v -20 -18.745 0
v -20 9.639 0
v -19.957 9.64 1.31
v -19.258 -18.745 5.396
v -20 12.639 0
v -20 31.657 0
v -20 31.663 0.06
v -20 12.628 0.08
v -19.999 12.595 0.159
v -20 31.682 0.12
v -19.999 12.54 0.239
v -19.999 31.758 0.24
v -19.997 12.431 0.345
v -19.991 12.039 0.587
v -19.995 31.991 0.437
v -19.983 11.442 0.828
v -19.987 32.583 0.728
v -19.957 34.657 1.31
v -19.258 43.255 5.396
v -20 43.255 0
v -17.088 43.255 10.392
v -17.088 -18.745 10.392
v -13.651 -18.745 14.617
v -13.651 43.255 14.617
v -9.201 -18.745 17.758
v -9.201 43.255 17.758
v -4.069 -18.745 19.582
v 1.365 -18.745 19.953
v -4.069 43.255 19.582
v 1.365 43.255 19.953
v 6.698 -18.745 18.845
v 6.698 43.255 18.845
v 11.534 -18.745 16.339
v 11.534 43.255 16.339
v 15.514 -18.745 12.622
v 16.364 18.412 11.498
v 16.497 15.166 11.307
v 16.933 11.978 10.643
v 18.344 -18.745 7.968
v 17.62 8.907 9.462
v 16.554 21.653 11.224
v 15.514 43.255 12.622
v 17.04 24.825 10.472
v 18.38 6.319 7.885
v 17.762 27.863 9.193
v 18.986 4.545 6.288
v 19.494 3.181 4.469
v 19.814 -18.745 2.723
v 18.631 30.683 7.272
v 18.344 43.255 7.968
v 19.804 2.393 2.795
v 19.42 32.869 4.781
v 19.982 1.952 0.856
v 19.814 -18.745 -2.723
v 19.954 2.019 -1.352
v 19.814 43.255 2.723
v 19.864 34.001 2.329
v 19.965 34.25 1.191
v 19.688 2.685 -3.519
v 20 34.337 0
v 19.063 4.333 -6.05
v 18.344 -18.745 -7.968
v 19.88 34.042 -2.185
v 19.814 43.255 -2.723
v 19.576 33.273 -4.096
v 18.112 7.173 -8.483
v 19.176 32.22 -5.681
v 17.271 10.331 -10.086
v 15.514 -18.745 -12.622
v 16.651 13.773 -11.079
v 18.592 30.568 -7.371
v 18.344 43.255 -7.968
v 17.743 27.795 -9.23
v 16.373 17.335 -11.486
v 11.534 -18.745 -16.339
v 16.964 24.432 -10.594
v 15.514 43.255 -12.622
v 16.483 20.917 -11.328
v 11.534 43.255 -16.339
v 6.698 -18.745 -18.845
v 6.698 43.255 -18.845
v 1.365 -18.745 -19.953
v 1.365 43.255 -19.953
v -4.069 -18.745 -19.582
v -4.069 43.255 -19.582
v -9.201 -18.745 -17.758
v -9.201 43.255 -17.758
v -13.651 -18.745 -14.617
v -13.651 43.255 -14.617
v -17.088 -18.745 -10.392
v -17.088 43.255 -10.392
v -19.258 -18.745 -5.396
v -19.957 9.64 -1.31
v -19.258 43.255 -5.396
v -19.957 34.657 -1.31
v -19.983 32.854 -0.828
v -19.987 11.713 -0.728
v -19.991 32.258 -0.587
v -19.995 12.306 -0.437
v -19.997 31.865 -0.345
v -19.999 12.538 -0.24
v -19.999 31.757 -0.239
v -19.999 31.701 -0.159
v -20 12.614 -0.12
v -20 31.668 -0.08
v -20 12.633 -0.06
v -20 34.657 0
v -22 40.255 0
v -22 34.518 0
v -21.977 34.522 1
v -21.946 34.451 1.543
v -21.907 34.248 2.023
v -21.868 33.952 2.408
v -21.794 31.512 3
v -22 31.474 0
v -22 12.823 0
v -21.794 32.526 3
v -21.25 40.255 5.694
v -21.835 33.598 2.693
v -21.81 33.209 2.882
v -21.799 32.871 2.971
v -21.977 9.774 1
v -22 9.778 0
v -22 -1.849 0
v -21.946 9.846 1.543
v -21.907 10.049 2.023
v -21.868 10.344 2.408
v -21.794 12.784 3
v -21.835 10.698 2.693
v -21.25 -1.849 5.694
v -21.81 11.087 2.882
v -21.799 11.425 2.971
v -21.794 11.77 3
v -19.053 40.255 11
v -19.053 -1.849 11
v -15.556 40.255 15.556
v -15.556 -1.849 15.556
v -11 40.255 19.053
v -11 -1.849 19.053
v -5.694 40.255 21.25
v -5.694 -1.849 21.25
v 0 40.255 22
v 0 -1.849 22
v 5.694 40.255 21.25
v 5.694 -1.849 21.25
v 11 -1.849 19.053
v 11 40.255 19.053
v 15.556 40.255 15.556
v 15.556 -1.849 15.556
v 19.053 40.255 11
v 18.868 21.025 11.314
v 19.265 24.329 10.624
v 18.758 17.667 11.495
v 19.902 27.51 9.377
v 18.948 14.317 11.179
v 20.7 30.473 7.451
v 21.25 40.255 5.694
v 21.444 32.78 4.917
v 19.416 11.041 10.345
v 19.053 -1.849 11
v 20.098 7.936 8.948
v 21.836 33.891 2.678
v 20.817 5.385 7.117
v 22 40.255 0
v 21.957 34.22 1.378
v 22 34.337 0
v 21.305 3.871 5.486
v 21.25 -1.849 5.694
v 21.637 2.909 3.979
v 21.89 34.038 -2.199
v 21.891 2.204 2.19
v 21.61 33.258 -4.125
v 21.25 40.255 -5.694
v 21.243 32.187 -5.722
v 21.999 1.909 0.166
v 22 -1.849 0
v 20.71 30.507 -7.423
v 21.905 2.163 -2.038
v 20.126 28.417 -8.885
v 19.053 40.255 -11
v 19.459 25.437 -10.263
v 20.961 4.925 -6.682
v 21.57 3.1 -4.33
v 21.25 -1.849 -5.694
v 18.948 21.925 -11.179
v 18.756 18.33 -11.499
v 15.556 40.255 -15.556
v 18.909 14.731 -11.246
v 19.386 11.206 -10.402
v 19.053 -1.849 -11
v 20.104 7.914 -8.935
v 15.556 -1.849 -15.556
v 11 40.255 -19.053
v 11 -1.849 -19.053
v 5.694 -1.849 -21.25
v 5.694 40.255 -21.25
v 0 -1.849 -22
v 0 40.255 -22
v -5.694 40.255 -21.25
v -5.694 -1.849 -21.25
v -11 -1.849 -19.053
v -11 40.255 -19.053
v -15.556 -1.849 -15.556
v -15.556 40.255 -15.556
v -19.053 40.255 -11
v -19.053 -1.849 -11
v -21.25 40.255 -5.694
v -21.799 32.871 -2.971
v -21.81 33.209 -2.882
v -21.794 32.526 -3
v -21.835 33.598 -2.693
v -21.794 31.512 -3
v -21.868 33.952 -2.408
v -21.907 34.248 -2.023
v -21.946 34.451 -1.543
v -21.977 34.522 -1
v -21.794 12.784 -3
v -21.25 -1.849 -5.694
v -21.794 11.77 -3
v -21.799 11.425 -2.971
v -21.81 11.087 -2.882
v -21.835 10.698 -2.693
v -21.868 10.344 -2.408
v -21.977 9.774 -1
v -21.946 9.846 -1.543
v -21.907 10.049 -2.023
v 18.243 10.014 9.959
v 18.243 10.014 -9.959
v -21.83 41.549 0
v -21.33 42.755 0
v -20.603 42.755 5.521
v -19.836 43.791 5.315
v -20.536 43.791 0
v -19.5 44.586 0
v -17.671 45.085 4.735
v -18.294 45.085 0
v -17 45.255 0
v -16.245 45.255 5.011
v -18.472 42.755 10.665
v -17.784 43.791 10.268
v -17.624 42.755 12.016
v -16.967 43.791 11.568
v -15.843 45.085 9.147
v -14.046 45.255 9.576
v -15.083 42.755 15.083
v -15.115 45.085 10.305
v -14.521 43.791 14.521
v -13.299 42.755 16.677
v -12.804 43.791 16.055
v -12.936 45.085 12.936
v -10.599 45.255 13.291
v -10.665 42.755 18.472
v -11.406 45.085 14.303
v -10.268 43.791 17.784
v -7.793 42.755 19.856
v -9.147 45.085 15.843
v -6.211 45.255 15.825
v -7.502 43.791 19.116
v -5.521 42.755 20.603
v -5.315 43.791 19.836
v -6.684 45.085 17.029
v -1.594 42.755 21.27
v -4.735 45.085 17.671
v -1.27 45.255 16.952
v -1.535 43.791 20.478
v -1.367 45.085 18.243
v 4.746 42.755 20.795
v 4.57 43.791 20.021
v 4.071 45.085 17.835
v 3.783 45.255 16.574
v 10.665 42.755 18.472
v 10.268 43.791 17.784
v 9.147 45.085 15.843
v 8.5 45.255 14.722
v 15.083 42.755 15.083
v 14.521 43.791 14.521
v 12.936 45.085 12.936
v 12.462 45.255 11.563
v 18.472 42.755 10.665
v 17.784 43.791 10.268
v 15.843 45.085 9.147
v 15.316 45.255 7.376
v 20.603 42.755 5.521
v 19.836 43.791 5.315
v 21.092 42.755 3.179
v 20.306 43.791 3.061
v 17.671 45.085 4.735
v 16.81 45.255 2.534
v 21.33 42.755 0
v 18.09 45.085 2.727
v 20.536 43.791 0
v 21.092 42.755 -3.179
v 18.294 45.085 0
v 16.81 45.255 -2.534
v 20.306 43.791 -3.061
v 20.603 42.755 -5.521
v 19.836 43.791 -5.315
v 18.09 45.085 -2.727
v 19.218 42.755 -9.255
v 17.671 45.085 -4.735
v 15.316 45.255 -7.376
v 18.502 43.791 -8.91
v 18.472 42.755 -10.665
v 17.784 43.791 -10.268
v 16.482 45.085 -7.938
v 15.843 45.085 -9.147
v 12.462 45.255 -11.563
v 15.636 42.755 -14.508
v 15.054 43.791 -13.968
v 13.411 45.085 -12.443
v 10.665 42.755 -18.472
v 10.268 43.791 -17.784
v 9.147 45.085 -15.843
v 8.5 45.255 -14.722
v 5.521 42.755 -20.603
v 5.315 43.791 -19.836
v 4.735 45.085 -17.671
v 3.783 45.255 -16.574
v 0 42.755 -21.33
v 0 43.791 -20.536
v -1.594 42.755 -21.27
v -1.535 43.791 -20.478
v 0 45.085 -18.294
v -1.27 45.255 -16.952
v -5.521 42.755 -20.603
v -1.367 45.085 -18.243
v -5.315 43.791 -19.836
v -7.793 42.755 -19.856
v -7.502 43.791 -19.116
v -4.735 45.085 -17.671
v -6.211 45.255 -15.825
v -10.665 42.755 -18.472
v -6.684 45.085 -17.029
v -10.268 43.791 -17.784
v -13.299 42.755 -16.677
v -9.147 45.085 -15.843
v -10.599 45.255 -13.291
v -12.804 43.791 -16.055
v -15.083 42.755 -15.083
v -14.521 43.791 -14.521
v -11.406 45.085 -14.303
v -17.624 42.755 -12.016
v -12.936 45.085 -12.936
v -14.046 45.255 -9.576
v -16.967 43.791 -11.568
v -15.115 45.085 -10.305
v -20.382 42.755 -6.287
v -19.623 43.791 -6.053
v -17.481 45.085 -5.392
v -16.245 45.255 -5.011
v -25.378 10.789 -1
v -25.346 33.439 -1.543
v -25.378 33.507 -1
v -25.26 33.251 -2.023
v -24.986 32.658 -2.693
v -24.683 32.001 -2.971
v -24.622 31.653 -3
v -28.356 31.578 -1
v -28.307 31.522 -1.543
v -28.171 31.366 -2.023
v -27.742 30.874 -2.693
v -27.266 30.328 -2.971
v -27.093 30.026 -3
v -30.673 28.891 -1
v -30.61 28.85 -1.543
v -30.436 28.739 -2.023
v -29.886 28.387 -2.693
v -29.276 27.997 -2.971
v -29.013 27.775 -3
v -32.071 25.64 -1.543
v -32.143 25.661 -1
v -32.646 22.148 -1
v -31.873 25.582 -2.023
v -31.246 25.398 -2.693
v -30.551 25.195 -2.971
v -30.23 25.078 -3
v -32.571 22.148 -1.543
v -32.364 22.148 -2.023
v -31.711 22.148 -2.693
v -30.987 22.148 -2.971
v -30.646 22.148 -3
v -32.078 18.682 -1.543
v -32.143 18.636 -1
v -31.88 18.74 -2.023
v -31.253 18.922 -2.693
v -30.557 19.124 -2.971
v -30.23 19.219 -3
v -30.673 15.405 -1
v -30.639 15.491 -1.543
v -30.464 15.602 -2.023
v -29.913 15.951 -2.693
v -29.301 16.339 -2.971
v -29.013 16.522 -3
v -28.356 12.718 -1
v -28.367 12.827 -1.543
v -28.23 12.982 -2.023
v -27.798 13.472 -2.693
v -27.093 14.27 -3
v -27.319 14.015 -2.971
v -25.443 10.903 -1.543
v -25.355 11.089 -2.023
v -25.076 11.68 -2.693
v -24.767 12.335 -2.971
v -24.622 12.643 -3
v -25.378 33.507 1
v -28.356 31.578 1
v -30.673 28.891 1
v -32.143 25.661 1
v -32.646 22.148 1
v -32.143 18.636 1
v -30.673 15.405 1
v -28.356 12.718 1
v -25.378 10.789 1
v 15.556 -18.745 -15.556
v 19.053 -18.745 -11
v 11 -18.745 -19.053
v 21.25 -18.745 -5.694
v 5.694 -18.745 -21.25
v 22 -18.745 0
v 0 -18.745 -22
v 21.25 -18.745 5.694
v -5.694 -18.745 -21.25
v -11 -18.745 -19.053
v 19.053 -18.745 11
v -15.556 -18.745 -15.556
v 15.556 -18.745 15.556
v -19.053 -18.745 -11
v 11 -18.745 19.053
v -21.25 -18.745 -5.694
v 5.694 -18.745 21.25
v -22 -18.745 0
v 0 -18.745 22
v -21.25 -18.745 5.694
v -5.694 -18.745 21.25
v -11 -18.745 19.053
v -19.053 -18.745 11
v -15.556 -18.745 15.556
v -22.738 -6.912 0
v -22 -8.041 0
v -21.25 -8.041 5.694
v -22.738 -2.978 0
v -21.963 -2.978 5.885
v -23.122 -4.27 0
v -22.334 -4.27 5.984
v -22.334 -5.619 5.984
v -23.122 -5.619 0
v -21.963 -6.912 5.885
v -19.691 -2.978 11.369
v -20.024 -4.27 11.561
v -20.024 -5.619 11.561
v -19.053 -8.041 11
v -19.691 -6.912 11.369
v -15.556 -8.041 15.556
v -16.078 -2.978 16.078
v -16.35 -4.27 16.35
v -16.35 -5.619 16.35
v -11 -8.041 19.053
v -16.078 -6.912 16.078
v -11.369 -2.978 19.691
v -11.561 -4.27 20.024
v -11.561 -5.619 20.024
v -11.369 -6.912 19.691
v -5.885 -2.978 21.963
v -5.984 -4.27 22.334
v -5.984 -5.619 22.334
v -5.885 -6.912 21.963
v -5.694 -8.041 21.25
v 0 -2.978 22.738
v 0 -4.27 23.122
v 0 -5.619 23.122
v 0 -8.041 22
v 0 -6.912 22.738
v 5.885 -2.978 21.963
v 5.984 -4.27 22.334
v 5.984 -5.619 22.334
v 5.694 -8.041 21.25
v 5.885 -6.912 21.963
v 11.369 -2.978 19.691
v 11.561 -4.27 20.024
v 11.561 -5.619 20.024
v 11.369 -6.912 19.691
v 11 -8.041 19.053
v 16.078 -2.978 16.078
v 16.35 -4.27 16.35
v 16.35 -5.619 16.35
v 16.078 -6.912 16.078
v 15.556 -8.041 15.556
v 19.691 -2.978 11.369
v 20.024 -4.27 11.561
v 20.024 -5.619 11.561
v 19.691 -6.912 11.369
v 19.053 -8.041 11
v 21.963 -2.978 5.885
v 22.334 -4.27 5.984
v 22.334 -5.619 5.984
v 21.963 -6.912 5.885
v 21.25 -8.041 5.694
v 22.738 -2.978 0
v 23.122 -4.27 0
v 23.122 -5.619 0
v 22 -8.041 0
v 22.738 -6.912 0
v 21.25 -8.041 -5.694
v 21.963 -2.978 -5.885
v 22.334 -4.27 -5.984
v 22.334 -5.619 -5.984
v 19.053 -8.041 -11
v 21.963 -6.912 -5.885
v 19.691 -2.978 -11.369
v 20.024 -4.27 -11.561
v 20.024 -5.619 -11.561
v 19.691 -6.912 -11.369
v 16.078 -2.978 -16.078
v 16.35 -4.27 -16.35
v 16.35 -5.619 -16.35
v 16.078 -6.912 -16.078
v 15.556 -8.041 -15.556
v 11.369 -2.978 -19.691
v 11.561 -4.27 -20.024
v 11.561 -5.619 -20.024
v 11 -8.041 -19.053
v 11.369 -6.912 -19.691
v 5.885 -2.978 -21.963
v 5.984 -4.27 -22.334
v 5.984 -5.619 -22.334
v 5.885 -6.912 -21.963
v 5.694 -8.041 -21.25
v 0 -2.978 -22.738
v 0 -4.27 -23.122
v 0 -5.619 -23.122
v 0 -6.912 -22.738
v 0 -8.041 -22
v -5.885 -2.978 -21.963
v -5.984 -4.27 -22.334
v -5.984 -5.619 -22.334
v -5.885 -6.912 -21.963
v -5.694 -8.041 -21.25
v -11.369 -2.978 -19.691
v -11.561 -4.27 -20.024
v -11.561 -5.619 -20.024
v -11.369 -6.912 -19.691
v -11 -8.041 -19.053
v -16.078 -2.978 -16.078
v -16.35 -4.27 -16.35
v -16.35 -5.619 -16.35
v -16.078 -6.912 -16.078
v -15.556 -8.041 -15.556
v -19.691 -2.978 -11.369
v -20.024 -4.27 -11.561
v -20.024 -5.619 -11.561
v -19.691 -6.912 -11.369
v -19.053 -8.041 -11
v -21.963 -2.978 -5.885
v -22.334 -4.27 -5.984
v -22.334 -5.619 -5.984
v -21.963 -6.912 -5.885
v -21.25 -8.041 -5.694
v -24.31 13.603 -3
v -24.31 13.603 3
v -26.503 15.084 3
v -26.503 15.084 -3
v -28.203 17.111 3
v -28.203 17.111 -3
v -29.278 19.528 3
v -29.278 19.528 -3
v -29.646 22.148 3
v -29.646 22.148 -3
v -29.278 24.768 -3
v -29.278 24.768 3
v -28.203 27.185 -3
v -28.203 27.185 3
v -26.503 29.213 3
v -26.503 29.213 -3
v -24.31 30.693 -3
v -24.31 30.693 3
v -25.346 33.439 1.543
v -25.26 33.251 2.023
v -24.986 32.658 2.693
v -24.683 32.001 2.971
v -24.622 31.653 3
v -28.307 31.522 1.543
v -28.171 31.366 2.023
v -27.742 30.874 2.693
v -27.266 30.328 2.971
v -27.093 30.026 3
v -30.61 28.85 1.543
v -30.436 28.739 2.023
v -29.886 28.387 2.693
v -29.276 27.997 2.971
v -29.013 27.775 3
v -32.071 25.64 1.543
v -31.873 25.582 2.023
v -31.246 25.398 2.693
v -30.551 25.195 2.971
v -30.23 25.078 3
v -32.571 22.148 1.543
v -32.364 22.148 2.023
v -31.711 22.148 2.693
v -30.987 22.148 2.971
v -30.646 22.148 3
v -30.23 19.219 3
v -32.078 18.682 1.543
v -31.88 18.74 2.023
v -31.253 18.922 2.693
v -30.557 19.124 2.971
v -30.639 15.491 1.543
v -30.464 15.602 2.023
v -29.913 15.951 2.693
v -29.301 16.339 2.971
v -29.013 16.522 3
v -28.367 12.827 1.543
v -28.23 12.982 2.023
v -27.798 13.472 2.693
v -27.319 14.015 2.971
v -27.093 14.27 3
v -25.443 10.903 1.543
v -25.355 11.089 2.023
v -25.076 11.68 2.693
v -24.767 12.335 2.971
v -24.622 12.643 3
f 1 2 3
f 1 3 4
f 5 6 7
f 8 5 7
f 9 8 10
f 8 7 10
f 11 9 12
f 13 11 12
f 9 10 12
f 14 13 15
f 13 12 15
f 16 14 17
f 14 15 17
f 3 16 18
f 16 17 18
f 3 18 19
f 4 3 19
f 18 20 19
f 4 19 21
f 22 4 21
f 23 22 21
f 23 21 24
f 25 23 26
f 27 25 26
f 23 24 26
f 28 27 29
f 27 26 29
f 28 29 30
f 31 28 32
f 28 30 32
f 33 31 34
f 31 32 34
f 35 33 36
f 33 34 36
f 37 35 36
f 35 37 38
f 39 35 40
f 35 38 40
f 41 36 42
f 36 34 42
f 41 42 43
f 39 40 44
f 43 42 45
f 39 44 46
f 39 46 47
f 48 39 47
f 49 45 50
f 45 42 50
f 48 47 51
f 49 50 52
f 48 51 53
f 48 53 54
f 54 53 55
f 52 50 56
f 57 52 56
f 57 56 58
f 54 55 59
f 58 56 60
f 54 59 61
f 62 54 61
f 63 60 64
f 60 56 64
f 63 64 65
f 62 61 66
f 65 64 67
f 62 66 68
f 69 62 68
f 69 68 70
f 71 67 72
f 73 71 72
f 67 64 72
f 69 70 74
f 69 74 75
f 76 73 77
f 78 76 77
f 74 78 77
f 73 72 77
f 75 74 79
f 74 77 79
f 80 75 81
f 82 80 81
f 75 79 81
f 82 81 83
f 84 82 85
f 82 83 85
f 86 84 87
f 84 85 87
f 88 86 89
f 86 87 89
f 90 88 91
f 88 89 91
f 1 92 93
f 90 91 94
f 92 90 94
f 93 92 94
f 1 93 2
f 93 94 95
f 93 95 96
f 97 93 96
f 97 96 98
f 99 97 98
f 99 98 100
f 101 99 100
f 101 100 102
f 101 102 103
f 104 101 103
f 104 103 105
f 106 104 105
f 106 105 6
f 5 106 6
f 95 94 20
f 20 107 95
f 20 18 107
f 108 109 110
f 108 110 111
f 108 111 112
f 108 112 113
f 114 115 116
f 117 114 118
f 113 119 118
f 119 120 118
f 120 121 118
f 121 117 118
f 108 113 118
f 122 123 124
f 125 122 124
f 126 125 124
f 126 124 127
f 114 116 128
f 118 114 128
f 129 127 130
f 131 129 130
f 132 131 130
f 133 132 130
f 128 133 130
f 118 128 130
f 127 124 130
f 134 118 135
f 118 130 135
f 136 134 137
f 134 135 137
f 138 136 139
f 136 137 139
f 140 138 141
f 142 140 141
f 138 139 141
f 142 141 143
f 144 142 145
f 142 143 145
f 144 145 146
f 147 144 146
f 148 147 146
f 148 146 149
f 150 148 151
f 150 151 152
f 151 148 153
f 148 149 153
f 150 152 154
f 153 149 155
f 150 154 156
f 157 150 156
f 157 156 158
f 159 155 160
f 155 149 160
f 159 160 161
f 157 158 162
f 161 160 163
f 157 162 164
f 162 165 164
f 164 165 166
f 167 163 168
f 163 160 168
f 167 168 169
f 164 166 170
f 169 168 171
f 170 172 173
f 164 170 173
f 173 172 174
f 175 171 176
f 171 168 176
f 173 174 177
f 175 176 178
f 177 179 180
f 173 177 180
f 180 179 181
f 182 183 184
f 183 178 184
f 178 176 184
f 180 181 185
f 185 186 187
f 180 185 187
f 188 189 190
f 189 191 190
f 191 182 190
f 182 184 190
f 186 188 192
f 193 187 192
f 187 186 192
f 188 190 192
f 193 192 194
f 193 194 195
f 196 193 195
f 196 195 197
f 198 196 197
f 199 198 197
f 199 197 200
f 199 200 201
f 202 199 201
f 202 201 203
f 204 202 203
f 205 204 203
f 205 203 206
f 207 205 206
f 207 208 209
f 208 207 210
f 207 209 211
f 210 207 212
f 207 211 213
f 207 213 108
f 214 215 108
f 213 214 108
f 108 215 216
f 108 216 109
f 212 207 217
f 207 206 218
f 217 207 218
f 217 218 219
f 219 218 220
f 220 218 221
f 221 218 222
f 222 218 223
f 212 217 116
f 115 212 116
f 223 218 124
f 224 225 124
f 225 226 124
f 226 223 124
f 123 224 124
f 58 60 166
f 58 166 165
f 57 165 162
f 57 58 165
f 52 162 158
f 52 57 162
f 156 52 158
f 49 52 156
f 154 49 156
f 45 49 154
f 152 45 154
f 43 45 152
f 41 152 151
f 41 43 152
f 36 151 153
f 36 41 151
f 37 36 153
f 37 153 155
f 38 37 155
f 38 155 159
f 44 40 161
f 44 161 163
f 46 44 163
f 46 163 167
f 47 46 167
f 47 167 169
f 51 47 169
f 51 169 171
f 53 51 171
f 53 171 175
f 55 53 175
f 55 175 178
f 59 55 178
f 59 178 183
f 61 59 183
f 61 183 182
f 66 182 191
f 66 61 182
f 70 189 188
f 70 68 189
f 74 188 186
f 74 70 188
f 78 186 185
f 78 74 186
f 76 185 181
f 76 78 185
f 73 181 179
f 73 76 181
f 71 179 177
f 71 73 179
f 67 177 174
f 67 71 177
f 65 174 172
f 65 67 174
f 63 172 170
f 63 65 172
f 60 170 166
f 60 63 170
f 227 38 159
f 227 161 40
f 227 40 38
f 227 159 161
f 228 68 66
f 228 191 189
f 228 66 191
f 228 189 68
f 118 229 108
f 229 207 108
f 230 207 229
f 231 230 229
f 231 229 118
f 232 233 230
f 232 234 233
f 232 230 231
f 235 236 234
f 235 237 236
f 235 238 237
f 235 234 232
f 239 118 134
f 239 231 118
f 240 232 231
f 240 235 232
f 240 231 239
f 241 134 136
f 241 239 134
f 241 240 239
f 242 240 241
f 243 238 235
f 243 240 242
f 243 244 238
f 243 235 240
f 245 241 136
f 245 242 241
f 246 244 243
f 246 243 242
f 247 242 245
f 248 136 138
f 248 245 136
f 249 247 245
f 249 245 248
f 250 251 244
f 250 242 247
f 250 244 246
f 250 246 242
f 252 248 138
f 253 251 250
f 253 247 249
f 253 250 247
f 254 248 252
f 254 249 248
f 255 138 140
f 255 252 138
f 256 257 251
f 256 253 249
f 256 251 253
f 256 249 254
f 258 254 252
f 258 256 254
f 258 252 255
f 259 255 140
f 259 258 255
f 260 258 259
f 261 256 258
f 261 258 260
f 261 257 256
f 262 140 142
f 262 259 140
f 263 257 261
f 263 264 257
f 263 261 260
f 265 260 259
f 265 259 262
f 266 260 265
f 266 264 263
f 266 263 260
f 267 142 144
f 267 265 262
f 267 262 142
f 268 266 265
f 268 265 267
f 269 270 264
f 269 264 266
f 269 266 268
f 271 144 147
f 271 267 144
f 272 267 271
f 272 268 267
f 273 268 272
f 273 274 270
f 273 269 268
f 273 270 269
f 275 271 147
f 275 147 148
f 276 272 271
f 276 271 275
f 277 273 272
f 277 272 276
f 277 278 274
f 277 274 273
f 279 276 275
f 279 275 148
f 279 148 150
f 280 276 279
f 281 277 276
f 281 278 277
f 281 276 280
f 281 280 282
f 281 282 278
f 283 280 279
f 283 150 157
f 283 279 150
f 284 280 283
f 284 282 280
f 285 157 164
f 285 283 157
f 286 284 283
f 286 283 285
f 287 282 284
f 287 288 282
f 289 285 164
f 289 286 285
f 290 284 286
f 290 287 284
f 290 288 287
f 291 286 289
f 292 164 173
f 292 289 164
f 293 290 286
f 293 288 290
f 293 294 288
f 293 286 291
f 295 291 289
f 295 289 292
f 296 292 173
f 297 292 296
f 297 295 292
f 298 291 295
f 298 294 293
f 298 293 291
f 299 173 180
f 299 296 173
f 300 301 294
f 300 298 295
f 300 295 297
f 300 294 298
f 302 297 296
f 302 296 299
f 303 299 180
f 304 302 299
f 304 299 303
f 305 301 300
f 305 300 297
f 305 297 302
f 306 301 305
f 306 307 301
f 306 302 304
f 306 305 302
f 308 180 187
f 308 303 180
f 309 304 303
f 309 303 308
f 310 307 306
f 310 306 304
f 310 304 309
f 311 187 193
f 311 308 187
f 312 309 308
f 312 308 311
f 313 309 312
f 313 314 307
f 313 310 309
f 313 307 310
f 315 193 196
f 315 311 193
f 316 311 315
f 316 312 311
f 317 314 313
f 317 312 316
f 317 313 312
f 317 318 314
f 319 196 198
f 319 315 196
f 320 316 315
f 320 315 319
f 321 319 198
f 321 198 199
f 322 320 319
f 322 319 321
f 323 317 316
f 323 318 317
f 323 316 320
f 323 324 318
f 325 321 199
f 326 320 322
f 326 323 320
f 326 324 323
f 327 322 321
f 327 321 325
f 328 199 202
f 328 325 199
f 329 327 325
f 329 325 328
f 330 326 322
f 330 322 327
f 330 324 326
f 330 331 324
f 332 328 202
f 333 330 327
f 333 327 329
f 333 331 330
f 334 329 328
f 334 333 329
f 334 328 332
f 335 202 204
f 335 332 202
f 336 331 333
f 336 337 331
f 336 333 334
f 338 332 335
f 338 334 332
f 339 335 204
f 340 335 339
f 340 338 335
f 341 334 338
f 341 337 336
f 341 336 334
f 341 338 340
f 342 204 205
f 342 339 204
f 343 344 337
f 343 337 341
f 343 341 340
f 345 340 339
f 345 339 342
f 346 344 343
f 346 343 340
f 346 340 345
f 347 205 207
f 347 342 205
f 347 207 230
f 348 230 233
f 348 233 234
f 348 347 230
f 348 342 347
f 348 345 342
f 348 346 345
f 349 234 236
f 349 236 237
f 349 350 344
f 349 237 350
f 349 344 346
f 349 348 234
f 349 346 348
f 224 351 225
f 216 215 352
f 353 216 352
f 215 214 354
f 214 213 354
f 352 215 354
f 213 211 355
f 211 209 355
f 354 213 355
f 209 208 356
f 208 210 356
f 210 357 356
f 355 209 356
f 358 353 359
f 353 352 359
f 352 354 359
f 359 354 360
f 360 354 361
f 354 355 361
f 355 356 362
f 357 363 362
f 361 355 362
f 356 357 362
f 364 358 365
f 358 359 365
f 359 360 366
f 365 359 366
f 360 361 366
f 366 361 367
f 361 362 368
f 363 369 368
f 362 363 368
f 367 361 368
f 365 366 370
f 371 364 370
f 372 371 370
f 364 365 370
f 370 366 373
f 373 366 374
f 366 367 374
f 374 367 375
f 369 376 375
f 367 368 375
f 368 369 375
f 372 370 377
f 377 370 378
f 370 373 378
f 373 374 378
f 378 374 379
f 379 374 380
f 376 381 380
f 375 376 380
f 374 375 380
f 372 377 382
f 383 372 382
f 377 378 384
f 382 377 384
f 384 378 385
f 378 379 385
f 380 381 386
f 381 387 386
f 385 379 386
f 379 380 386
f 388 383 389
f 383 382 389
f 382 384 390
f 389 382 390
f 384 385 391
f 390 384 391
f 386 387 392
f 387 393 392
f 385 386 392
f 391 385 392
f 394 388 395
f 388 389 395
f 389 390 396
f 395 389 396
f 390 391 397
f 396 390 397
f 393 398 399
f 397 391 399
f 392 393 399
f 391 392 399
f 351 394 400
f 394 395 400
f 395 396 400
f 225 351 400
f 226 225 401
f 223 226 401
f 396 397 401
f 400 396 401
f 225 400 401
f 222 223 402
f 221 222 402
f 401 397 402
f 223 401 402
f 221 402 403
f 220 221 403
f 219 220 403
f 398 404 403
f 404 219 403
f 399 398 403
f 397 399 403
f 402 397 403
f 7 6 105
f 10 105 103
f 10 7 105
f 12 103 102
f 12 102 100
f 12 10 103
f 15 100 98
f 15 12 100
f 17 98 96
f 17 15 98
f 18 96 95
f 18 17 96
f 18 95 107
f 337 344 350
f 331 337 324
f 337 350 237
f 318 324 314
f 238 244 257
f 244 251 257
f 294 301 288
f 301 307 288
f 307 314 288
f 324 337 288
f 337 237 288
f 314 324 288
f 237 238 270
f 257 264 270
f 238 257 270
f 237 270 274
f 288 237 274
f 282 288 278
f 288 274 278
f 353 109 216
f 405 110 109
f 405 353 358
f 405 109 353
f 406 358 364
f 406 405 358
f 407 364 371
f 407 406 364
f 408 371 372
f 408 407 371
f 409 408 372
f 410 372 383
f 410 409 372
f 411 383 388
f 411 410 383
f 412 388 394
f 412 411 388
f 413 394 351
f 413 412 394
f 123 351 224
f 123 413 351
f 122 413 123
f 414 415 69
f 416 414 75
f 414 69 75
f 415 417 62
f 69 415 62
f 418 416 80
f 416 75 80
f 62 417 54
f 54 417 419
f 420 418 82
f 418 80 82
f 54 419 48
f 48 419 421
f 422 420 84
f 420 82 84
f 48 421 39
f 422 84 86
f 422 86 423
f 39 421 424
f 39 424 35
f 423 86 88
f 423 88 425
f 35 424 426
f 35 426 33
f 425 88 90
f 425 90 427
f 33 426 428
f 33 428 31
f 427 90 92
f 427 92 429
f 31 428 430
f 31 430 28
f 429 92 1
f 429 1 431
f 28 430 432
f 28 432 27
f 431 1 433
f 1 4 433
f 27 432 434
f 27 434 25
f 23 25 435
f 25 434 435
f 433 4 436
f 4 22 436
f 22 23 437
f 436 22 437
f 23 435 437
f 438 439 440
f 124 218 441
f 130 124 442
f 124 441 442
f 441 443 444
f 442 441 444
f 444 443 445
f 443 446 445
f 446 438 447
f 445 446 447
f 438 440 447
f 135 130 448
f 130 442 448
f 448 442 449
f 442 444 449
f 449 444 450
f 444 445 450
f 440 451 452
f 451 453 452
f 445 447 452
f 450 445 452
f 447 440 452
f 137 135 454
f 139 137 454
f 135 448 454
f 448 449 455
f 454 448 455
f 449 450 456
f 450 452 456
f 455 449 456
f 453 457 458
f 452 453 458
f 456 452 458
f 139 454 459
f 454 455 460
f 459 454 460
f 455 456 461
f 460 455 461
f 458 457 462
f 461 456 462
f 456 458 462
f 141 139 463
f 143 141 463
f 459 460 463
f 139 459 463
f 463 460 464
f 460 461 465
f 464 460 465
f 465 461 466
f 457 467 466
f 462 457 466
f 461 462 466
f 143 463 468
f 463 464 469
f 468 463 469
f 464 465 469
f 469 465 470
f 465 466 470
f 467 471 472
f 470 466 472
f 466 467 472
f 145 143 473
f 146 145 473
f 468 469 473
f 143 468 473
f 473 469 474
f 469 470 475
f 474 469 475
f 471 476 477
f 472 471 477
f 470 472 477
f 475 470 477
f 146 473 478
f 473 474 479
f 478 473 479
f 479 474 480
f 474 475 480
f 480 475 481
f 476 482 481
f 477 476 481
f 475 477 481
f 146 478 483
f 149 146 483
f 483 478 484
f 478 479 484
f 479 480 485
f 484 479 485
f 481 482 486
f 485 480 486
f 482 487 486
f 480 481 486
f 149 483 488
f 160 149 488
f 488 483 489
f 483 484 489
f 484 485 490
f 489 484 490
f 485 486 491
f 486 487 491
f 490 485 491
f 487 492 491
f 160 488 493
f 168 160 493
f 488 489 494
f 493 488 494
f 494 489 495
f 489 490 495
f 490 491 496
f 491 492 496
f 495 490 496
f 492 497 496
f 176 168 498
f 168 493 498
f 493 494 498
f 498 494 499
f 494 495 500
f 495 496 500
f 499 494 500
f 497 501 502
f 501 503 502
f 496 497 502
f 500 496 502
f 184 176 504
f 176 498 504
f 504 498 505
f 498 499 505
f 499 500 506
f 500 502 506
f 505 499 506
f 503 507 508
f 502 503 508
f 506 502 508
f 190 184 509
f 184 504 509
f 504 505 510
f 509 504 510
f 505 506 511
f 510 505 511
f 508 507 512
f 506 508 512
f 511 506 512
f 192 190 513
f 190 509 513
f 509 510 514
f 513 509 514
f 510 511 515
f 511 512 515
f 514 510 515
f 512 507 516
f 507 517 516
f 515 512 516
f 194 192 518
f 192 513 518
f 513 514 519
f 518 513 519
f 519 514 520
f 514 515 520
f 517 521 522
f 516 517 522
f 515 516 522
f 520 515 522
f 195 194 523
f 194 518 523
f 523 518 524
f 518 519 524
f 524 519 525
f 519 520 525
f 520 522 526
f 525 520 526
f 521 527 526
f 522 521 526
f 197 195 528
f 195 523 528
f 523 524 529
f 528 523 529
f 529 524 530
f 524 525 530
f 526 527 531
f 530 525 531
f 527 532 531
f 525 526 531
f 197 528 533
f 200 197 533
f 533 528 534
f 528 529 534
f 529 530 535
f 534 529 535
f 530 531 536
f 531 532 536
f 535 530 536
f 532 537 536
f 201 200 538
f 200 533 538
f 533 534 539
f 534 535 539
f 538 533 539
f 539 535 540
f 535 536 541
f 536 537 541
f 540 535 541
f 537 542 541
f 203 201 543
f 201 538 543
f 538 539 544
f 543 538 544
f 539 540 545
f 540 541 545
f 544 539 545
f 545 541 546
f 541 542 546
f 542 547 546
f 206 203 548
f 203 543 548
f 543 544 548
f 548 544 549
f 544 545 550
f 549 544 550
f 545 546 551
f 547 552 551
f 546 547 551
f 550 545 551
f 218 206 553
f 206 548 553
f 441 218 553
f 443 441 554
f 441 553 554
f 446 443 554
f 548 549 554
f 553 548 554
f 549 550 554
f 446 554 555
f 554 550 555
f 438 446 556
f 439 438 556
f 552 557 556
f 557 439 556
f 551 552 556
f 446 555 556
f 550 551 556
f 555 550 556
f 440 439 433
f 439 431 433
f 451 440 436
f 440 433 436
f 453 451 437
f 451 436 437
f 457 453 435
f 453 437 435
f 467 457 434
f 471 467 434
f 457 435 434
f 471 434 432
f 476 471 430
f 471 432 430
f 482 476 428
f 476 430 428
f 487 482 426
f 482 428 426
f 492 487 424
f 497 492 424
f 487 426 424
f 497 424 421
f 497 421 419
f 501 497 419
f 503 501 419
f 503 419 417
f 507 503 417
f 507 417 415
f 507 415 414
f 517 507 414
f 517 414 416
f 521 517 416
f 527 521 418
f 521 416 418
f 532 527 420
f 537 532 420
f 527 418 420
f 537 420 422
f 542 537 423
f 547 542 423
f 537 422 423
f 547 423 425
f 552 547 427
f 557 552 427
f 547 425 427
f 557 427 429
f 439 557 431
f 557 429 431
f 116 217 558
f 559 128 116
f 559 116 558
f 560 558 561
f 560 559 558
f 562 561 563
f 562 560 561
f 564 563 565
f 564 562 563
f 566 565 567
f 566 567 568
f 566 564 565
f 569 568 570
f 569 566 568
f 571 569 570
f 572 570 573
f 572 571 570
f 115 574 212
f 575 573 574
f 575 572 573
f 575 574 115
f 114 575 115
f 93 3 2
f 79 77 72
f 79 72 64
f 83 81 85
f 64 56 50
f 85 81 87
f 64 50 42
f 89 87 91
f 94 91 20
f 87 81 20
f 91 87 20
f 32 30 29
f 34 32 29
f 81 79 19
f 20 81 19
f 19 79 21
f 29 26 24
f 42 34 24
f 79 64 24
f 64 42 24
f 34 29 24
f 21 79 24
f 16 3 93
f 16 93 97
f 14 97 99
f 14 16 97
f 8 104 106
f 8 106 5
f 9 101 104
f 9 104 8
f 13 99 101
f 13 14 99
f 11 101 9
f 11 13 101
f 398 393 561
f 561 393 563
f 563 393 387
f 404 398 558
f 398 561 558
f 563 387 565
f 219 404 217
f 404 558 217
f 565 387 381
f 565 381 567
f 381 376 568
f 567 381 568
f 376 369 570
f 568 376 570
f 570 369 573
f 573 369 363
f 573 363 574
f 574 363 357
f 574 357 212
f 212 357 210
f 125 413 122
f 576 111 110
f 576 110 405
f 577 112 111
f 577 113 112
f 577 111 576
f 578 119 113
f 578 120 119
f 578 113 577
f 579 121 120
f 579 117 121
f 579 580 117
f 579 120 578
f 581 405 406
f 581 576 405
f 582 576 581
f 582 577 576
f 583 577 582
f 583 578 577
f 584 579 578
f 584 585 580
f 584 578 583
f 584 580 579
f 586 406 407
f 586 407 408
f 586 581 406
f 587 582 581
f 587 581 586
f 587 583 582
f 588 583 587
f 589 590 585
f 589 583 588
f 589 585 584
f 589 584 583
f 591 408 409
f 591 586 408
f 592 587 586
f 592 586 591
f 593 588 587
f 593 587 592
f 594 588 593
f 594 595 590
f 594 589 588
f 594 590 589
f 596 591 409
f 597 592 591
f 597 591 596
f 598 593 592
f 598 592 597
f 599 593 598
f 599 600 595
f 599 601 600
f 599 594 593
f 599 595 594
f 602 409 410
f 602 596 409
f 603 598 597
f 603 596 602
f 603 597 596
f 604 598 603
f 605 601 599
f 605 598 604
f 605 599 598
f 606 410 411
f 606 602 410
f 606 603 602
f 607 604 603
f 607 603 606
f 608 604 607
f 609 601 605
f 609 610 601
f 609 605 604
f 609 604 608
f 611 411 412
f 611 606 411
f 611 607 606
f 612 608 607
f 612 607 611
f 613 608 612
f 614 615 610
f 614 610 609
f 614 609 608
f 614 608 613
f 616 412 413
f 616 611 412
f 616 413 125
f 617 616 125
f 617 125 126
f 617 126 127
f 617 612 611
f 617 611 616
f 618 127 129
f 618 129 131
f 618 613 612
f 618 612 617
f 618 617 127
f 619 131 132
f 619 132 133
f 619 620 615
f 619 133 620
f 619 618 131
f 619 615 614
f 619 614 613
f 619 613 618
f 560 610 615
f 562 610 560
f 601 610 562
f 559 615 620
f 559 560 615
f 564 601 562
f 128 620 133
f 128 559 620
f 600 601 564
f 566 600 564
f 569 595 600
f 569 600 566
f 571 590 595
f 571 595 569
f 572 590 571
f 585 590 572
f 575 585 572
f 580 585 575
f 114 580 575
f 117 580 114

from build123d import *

# Parameters (mm, degrees)
F3_DEPTH = 3
F4_R     = 5
F5_R     = 2
F7_DEPTH = 30


with BuildPart() as f1:
    # F0 (on Top) → F1 (revolve)
    with BuildSketch(Plane.XY):
        Polygon((-20, 43.255373), (0, 43.255373), (0, 45.255373), (-22, 45.255373), (-22, -1.848867), (-22, -8.040607), (-22, -18.744627), (-20, -18.744627), align=None)
        with BuildLine():
            Line((-22, -8.040607), (-22, -1.848867))
            ThreePointArc((-22, -1.848867), (-23.171118, -4.944737), (-22, -8.040607))
        make_face()
    revolve(axis=Axis((0, -2.109665, 0), (0, 1, 0)))

    # F2 (on Top) → F3 (join, symmetric)
    with BuildSketch(Plane.XY):
        with BuildLine():
            ThreePointArc((-20, 12.639232), (-29.646143, 22.148181), (-20, 31.65713))
            Line((-20, 31.65713), (-19.957029, 34.656822))
            ThreePointArc((-19.957029, 34.656822), (-32.646143, 22.148181), (-19.957029, 9.63954))
            Line((-19.957029, 9.63954), (-20, 12.639232))
        make_face()
    extrude(amount=F3_DEPTH, both=True)

    # F4
    f4_edges = [f1.edges().sort_by_distance(p)[0] for p in [
        (22, 45.255373, 0),
    ]]
    fillet(f4_edges, radius=F4_R)

    # F5
    f5_edges = [f1.edges().sort_by_distance(p)[0] for p in [
        (-32.646143, 22.148181, 3),
        (-32.646143, 22.148181, -3),
    ]]
    fillet(f5_edges, radius=F5_R)

    # F6 (on Right) → F7 (cut)
    with BuildSketch(Plane.YZ):
        with BuildLine():
            add(Edge.make_bspline(
                [(34.336799, 0), (34.336799, 19.918584), (10.014392, 9.959292), (-14.308014, 0), (10.014392, -9.959292), (34.336799, -19.918584), (34.336799, 0)],
                knots=[0, 0, 0, 2.094395, 2.094395, 4.18879, 4.18879, 6.283185, 6.283185, 6.283185], degree=2, weights=[1, 0.5, 1, 0.5, 1, 0.5, 1]))
        make_face()
    extrude(amount=F7_DEPTH, mode=Mode.SUBTRACT)


solid = f1.part
